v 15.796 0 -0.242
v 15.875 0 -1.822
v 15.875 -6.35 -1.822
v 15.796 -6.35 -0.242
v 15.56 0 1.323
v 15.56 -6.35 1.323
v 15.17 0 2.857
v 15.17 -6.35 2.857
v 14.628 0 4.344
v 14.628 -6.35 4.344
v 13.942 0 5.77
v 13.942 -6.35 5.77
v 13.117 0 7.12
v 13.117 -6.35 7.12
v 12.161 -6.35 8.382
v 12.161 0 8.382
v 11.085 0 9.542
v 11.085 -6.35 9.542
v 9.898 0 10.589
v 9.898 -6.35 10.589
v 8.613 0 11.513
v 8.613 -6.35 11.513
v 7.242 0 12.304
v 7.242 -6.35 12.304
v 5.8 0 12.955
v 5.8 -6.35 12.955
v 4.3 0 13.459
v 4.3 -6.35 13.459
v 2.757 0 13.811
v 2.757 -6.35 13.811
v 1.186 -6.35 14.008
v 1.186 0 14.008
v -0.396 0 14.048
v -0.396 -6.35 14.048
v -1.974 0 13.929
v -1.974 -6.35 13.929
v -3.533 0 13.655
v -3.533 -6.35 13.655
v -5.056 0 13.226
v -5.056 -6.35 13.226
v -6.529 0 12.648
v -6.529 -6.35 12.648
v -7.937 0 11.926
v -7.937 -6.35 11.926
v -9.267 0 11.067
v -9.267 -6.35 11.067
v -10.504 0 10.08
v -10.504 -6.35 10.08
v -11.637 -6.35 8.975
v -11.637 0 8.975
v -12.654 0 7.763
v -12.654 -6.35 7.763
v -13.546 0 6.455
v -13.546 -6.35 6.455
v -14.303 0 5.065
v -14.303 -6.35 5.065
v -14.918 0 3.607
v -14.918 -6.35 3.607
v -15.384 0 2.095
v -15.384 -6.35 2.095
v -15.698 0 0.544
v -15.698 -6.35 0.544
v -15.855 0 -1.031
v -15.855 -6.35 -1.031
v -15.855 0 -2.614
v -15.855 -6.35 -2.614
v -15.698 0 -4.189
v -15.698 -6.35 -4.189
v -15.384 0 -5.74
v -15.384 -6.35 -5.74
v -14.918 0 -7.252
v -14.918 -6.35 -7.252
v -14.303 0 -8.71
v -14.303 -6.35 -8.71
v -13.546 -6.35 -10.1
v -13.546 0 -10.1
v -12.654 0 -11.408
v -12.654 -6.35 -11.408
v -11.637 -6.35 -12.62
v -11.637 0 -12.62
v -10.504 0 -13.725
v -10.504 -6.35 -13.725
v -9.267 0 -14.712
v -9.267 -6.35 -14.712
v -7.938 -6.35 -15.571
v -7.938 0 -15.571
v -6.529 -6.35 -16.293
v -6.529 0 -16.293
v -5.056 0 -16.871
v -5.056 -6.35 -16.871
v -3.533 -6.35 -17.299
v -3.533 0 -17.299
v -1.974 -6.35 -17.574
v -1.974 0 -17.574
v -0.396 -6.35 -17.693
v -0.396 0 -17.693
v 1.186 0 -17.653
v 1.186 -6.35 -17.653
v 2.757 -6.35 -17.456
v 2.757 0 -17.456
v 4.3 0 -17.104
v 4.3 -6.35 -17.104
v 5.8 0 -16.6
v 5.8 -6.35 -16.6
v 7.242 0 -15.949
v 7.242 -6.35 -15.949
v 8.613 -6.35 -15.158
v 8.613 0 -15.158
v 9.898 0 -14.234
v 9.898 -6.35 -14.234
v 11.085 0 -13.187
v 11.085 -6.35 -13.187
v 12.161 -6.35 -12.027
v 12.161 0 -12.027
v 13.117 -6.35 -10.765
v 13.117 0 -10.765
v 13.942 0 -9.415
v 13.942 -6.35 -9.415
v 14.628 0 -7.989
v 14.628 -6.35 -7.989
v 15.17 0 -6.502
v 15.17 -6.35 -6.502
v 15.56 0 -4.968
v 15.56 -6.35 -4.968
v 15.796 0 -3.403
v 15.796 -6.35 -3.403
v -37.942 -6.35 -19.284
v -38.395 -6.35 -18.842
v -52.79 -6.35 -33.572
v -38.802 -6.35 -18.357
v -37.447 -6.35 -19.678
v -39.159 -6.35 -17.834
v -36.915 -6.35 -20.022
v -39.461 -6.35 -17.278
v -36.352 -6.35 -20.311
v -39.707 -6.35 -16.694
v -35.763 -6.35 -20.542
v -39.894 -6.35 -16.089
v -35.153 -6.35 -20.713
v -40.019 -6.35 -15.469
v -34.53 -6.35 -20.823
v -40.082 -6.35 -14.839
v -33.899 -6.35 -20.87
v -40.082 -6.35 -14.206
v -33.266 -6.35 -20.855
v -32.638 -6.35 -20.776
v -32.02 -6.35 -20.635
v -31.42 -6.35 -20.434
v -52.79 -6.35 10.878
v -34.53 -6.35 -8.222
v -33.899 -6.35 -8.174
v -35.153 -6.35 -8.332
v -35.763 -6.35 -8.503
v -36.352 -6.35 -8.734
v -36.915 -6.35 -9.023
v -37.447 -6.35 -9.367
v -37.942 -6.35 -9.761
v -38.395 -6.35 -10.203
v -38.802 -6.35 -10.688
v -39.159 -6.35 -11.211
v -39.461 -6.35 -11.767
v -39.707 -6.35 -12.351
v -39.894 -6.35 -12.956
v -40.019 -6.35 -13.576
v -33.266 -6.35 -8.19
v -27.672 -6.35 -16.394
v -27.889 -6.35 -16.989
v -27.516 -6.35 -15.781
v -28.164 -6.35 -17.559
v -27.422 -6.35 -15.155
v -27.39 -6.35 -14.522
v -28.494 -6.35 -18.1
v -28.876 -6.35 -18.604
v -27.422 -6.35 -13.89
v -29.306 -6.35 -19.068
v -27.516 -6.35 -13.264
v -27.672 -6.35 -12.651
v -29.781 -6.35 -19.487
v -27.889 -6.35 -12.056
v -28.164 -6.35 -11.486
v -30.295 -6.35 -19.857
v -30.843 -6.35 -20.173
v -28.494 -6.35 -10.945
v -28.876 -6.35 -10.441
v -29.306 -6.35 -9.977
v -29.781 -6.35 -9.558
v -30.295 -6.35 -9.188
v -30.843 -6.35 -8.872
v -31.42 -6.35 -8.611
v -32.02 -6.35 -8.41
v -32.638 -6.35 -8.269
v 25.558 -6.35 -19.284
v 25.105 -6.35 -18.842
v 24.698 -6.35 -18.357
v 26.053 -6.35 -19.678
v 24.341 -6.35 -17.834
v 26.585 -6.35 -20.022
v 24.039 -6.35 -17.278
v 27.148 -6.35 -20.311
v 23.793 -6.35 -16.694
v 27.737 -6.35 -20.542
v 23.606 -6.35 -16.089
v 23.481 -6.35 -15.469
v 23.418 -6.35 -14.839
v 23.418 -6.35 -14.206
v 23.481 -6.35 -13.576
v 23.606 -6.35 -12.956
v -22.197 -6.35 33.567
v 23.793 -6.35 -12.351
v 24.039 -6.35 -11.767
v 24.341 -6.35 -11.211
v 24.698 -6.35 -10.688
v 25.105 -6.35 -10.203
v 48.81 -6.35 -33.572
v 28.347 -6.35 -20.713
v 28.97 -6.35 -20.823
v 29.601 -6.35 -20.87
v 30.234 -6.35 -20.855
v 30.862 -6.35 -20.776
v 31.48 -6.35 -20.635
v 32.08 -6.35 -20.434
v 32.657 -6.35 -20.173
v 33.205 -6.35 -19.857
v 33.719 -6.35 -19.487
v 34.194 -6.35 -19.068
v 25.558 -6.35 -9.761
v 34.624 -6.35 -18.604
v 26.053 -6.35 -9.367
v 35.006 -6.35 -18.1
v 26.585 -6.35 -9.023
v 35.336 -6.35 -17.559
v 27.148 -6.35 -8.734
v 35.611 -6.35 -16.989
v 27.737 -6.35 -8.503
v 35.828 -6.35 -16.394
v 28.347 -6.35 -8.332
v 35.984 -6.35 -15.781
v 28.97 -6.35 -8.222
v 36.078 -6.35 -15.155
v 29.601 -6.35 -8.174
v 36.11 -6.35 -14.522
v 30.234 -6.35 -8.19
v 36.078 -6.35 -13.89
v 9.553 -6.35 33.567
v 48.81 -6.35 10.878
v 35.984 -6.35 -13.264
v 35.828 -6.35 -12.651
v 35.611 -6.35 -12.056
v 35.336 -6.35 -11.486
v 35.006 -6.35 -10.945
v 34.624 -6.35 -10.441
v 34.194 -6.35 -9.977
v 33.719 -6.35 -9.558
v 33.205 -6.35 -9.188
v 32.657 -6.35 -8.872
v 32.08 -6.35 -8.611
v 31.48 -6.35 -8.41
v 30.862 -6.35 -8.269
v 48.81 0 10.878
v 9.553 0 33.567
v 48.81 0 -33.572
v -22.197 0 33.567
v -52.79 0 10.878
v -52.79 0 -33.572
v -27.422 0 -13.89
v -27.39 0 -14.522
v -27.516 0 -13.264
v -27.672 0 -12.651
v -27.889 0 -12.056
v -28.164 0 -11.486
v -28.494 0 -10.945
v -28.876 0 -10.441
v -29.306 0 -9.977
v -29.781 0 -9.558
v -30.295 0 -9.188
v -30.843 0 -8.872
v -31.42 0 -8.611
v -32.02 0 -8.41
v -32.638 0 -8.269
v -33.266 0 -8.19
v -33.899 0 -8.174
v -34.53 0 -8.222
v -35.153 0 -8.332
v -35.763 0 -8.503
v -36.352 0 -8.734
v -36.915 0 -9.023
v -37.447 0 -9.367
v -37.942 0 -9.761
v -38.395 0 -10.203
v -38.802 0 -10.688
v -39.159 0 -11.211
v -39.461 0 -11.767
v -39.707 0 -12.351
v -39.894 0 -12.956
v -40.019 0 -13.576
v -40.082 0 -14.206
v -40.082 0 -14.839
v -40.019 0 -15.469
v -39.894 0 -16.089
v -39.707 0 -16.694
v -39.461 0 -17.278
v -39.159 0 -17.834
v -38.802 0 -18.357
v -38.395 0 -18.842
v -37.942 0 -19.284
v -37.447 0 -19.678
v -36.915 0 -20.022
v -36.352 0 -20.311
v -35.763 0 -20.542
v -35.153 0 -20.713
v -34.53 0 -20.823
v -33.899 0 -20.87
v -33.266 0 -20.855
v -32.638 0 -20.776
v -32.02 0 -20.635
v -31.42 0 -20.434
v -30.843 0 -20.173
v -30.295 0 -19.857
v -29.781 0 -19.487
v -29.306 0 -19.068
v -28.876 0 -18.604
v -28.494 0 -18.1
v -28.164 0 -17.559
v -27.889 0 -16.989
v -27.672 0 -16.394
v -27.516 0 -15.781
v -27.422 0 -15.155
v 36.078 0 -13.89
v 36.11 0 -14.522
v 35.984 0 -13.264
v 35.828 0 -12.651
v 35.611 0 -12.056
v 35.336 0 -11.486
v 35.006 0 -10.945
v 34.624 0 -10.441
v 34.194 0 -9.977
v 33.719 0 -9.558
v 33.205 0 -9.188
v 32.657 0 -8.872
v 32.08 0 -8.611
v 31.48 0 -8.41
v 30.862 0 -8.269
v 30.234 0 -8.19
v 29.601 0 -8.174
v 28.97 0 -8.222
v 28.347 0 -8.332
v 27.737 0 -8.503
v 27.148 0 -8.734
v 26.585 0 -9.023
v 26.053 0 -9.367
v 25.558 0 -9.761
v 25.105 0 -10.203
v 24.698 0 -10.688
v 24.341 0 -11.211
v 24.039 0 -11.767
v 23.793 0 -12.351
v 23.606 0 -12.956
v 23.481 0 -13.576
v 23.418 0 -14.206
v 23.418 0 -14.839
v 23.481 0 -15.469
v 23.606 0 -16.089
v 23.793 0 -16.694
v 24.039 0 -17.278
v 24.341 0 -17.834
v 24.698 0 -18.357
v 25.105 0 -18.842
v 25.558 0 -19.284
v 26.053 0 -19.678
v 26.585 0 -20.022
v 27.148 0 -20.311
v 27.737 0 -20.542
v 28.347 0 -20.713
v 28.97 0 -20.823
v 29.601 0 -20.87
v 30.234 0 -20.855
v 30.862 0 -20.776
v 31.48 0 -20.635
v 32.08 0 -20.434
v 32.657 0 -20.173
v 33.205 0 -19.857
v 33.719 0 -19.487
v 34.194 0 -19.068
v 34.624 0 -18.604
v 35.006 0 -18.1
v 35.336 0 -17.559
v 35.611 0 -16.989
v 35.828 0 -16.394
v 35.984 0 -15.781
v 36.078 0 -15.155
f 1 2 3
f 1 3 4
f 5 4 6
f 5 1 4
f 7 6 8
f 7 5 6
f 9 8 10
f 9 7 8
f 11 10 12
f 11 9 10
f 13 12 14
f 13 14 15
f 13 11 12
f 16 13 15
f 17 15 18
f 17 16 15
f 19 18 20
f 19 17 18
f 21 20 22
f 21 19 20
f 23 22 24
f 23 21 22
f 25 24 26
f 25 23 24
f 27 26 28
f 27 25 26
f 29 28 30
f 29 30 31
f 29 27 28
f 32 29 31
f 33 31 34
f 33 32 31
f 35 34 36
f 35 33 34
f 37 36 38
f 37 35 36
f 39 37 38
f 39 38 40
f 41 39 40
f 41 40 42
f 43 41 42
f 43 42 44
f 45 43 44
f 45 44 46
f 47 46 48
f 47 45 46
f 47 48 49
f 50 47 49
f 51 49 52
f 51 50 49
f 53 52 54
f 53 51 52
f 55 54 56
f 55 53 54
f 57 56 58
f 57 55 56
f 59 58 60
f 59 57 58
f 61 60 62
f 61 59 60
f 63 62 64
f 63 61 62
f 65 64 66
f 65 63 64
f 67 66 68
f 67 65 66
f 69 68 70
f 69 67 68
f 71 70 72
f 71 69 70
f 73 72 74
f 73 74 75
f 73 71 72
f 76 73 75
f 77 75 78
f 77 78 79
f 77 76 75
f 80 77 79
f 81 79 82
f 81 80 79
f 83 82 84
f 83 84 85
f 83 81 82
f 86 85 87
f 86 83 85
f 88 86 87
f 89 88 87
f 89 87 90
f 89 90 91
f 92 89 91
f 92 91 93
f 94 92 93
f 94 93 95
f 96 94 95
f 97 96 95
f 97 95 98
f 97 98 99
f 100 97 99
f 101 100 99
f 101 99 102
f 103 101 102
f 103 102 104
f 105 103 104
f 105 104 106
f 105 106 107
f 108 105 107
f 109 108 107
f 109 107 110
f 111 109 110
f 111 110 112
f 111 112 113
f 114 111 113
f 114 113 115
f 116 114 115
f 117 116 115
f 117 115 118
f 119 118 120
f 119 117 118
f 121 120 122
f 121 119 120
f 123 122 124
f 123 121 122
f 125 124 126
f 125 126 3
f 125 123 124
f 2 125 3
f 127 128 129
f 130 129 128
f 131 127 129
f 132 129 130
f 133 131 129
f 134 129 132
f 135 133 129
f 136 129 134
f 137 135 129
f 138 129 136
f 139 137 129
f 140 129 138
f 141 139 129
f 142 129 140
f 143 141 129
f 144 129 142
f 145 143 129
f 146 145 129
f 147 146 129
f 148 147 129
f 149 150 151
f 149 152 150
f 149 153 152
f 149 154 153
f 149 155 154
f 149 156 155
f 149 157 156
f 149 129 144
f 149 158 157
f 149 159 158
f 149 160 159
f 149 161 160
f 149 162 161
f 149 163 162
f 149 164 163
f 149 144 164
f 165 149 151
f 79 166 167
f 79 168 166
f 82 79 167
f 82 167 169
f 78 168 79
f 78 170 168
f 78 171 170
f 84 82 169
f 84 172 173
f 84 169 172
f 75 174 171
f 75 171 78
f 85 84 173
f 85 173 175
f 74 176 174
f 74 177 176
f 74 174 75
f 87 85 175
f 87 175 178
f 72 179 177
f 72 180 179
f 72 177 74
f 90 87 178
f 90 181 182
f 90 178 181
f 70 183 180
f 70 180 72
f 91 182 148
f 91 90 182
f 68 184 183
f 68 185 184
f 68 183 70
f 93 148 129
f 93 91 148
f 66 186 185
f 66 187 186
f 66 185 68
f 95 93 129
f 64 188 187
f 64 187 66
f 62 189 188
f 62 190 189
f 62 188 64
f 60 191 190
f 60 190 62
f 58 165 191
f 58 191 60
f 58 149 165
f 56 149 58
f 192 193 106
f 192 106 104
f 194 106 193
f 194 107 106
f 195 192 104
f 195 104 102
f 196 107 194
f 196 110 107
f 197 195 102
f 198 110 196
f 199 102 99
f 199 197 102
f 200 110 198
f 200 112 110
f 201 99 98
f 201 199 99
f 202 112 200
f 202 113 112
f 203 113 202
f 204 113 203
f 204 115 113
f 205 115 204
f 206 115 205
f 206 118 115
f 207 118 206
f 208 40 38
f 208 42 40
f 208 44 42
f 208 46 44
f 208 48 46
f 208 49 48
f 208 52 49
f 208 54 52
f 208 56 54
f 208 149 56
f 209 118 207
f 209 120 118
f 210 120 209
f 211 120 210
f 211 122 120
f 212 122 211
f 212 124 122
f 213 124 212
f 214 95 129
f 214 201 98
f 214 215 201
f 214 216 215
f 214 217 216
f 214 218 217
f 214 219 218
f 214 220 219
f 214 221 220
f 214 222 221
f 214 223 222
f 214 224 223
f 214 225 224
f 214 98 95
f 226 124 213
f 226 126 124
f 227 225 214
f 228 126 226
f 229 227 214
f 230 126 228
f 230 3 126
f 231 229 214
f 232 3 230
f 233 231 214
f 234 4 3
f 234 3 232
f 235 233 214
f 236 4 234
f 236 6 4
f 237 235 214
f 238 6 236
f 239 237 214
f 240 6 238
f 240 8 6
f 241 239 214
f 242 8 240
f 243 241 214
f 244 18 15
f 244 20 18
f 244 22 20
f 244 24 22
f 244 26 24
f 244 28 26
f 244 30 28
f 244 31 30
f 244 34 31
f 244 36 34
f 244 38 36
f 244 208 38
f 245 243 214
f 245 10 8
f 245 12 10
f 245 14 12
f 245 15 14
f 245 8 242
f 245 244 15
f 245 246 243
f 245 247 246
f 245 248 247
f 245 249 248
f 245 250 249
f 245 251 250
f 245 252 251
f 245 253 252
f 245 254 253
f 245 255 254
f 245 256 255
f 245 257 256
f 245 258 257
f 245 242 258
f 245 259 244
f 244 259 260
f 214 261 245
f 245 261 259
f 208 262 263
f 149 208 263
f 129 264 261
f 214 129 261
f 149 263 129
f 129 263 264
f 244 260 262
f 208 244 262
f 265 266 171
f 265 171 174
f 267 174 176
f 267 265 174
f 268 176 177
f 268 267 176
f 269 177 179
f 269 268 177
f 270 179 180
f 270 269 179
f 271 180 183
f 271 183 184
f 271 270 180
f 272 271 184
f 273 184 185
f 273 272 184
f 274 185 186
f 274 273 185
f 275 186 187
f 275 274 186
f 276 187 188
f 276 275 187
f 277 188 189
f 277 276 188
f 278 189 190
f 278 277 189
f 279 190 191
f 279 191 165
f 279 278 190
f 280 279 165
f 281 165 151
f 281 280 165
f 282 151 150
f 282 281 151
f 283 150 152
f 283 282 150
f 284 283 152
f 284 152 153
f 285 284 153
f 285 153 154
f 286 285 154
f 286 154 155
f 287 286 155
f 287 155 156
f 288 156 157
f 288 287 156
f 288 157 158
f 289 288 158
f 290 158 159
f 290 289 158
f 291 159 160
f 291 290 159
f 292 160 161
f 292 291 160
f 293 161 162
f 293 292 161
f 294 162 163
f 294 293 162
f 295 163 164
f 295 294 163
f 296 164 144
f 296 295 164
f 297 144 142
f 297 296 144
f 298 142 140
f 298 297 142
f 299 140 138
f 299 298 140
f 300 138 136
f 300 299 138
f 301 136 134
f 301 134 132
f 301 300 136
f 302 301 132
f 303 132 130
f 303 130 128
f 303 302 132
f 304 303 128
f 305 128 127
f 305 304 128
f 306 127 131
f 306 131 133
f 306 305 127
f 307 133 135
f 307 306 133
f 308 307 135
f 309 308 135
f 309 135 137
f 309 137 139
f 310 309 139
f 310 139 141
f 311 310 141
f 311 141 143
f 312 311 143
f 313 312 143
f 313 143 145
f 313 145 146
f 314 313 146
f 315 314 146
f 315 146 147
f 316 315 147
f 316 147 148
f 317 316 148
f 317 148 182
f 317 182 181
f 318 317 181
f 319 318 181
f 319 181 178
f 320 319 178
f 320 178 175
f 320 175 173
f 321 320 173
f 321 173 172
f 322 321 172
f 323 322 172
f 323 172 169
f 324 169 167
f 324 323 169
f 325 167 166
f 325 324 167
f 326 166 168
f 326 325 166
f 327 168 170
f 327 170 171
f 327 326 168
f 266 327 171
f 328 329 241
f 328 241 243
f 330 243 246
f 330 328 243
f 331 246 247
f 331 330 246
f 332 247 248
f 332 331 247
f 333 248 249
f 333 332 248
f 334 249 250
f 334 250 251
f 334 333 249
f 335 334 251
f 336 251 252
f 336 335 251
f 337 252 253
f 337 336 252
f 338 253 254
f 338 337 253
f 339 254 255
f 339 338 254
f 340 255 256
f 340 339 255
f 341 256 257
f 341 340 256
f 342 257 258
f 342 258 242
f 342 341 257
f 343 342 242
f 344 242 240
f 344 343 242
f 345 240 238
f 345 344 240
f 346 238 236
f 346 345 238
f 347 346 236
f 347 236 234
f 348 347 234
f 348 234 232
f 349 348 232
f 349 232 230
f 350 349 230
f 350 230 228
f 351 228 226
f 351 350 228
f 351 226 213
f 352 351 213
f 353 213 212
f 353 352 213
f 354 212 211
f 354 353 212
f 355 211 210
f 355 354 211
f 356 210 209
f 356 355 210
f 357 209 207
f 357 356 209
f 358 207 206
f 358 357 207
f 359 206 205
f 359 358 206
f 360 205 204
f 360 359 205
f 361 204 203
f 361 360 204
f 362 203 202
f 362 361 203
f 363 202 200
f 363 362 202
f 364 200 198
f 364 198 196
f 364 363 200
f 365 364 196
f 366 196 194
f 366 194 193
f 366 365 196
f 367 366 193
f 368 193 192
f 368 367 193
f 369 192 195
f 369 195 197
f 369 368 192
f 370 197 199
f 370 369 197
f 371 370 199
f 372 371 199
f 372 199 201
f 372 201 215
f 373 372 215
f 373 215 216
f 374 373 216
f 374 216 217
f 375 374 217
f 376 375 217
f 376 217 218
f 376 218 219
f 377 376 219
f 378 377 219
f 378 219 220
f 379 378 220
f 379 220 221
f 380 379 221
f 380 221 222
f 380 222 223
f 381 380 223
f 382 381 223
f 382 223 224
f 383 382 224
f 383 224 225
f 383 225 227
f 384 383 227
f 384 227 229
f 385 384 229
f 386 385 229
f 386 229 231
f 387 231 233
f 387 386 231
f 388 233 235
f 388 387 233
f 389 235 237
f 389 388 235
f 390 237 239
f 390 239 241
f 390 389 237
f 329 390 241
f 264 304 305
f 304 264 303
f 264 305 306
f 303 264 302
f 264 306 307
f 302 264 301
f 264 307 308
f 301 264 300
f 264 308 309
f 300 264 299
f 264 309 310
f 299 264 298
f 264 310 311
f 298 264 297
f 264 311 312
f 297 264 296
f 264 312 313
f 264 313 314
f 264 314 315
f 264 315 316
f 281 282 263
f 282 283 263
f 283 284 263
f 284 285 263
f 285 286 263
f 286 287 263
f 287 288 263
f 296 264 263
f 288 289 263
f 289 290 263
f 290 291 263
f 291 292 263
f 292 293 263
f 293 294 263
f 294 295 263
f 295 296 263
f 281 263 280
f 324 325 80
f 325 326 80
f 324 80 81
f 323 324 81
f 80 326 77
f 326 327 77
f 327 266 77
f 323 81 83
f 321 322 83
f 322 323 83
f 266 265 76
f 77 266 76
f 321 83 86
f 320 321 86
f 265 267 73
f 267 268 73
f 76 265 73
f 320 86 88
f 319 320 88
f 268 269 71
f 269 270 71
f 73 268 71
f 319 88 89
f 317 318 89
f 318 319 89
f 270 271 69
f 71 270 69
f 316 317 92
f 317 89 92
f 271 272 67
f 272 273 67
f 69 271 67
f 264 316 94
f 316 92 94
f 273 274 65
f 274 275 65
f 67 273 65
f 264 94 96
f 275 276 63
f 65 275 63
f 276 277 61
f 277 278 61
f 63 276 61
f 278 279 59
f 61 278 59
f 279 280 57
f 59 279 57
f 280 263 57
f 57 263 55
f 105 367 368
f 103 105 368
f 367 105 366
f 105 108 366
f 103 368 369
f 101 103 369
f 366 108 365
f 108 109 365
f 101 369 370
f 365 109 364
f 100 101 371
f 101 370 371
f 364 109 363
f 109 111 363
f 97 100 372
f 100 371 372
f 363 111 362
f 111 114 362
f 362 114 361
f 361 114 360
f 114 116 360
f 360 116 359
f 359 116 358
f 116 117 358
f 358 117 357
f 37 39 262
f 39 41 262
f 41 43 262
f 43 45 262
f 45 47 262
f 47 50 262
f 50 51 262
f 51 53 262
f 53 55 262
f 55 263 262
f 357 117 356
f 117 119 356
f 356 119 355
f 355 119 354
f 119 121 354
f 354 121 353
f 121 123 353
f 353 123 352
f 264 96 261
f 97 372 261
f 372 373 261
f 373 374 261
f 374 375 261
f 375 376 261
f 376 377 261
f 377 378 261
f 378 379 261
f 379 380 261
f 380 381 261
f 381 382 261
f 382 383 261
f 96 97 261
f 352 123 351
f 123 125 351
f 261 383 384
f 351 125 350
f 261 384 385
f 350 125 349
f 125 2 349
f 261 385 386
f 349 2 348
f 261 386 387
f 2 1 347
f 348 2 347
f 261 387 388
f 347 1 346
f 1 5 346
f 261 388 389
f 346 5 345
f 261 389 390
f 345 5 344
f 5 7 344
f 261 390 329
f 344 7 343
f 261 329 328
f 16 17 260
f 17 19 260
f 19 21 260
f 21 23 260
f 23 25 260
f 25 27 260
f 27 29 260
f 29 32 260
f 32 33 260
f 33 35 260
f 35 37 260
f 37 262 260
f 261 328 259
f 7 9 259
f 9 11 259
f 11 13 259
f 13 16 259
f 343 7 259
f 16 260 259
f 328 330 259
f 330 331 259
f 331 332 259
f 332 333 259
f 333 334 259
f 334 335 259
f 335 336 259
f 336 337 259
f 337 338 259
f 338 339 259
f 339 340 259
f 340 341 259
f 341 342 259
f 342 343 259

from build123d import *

# Parameters (mm, degrees)
F0_R     = 6.35
F0_R_2   = 15.875
F1_DEPTH = 6.35


with BuildPart() as f1:
    # F0 (on Front) → F1 (new body)
    with BuildSketch(Plane.XZ):
        Polygon((-52.790296, 10.877535), (-52.790296, -33.572465), (48.809704, -33.572465), (48.809704, 10.877535), (9.553431, 33.566941), (-22.196569, 33.566941), align=None)
        with Locations((-33.740296, -14.522465)):
            Circle(F0_R, mode=Mode.SUBTRACT)
        with Locations((0, -1.822465)):
            Circle(F0_R_2, mode=Mode.SUBTRACT)
        with Locations((29.759704, -14.522465)):
            Circle(F0_R, mode=Mode.SUBTRACT)
    extrude(amount=F1_DEPTH)


solid = f1.part
